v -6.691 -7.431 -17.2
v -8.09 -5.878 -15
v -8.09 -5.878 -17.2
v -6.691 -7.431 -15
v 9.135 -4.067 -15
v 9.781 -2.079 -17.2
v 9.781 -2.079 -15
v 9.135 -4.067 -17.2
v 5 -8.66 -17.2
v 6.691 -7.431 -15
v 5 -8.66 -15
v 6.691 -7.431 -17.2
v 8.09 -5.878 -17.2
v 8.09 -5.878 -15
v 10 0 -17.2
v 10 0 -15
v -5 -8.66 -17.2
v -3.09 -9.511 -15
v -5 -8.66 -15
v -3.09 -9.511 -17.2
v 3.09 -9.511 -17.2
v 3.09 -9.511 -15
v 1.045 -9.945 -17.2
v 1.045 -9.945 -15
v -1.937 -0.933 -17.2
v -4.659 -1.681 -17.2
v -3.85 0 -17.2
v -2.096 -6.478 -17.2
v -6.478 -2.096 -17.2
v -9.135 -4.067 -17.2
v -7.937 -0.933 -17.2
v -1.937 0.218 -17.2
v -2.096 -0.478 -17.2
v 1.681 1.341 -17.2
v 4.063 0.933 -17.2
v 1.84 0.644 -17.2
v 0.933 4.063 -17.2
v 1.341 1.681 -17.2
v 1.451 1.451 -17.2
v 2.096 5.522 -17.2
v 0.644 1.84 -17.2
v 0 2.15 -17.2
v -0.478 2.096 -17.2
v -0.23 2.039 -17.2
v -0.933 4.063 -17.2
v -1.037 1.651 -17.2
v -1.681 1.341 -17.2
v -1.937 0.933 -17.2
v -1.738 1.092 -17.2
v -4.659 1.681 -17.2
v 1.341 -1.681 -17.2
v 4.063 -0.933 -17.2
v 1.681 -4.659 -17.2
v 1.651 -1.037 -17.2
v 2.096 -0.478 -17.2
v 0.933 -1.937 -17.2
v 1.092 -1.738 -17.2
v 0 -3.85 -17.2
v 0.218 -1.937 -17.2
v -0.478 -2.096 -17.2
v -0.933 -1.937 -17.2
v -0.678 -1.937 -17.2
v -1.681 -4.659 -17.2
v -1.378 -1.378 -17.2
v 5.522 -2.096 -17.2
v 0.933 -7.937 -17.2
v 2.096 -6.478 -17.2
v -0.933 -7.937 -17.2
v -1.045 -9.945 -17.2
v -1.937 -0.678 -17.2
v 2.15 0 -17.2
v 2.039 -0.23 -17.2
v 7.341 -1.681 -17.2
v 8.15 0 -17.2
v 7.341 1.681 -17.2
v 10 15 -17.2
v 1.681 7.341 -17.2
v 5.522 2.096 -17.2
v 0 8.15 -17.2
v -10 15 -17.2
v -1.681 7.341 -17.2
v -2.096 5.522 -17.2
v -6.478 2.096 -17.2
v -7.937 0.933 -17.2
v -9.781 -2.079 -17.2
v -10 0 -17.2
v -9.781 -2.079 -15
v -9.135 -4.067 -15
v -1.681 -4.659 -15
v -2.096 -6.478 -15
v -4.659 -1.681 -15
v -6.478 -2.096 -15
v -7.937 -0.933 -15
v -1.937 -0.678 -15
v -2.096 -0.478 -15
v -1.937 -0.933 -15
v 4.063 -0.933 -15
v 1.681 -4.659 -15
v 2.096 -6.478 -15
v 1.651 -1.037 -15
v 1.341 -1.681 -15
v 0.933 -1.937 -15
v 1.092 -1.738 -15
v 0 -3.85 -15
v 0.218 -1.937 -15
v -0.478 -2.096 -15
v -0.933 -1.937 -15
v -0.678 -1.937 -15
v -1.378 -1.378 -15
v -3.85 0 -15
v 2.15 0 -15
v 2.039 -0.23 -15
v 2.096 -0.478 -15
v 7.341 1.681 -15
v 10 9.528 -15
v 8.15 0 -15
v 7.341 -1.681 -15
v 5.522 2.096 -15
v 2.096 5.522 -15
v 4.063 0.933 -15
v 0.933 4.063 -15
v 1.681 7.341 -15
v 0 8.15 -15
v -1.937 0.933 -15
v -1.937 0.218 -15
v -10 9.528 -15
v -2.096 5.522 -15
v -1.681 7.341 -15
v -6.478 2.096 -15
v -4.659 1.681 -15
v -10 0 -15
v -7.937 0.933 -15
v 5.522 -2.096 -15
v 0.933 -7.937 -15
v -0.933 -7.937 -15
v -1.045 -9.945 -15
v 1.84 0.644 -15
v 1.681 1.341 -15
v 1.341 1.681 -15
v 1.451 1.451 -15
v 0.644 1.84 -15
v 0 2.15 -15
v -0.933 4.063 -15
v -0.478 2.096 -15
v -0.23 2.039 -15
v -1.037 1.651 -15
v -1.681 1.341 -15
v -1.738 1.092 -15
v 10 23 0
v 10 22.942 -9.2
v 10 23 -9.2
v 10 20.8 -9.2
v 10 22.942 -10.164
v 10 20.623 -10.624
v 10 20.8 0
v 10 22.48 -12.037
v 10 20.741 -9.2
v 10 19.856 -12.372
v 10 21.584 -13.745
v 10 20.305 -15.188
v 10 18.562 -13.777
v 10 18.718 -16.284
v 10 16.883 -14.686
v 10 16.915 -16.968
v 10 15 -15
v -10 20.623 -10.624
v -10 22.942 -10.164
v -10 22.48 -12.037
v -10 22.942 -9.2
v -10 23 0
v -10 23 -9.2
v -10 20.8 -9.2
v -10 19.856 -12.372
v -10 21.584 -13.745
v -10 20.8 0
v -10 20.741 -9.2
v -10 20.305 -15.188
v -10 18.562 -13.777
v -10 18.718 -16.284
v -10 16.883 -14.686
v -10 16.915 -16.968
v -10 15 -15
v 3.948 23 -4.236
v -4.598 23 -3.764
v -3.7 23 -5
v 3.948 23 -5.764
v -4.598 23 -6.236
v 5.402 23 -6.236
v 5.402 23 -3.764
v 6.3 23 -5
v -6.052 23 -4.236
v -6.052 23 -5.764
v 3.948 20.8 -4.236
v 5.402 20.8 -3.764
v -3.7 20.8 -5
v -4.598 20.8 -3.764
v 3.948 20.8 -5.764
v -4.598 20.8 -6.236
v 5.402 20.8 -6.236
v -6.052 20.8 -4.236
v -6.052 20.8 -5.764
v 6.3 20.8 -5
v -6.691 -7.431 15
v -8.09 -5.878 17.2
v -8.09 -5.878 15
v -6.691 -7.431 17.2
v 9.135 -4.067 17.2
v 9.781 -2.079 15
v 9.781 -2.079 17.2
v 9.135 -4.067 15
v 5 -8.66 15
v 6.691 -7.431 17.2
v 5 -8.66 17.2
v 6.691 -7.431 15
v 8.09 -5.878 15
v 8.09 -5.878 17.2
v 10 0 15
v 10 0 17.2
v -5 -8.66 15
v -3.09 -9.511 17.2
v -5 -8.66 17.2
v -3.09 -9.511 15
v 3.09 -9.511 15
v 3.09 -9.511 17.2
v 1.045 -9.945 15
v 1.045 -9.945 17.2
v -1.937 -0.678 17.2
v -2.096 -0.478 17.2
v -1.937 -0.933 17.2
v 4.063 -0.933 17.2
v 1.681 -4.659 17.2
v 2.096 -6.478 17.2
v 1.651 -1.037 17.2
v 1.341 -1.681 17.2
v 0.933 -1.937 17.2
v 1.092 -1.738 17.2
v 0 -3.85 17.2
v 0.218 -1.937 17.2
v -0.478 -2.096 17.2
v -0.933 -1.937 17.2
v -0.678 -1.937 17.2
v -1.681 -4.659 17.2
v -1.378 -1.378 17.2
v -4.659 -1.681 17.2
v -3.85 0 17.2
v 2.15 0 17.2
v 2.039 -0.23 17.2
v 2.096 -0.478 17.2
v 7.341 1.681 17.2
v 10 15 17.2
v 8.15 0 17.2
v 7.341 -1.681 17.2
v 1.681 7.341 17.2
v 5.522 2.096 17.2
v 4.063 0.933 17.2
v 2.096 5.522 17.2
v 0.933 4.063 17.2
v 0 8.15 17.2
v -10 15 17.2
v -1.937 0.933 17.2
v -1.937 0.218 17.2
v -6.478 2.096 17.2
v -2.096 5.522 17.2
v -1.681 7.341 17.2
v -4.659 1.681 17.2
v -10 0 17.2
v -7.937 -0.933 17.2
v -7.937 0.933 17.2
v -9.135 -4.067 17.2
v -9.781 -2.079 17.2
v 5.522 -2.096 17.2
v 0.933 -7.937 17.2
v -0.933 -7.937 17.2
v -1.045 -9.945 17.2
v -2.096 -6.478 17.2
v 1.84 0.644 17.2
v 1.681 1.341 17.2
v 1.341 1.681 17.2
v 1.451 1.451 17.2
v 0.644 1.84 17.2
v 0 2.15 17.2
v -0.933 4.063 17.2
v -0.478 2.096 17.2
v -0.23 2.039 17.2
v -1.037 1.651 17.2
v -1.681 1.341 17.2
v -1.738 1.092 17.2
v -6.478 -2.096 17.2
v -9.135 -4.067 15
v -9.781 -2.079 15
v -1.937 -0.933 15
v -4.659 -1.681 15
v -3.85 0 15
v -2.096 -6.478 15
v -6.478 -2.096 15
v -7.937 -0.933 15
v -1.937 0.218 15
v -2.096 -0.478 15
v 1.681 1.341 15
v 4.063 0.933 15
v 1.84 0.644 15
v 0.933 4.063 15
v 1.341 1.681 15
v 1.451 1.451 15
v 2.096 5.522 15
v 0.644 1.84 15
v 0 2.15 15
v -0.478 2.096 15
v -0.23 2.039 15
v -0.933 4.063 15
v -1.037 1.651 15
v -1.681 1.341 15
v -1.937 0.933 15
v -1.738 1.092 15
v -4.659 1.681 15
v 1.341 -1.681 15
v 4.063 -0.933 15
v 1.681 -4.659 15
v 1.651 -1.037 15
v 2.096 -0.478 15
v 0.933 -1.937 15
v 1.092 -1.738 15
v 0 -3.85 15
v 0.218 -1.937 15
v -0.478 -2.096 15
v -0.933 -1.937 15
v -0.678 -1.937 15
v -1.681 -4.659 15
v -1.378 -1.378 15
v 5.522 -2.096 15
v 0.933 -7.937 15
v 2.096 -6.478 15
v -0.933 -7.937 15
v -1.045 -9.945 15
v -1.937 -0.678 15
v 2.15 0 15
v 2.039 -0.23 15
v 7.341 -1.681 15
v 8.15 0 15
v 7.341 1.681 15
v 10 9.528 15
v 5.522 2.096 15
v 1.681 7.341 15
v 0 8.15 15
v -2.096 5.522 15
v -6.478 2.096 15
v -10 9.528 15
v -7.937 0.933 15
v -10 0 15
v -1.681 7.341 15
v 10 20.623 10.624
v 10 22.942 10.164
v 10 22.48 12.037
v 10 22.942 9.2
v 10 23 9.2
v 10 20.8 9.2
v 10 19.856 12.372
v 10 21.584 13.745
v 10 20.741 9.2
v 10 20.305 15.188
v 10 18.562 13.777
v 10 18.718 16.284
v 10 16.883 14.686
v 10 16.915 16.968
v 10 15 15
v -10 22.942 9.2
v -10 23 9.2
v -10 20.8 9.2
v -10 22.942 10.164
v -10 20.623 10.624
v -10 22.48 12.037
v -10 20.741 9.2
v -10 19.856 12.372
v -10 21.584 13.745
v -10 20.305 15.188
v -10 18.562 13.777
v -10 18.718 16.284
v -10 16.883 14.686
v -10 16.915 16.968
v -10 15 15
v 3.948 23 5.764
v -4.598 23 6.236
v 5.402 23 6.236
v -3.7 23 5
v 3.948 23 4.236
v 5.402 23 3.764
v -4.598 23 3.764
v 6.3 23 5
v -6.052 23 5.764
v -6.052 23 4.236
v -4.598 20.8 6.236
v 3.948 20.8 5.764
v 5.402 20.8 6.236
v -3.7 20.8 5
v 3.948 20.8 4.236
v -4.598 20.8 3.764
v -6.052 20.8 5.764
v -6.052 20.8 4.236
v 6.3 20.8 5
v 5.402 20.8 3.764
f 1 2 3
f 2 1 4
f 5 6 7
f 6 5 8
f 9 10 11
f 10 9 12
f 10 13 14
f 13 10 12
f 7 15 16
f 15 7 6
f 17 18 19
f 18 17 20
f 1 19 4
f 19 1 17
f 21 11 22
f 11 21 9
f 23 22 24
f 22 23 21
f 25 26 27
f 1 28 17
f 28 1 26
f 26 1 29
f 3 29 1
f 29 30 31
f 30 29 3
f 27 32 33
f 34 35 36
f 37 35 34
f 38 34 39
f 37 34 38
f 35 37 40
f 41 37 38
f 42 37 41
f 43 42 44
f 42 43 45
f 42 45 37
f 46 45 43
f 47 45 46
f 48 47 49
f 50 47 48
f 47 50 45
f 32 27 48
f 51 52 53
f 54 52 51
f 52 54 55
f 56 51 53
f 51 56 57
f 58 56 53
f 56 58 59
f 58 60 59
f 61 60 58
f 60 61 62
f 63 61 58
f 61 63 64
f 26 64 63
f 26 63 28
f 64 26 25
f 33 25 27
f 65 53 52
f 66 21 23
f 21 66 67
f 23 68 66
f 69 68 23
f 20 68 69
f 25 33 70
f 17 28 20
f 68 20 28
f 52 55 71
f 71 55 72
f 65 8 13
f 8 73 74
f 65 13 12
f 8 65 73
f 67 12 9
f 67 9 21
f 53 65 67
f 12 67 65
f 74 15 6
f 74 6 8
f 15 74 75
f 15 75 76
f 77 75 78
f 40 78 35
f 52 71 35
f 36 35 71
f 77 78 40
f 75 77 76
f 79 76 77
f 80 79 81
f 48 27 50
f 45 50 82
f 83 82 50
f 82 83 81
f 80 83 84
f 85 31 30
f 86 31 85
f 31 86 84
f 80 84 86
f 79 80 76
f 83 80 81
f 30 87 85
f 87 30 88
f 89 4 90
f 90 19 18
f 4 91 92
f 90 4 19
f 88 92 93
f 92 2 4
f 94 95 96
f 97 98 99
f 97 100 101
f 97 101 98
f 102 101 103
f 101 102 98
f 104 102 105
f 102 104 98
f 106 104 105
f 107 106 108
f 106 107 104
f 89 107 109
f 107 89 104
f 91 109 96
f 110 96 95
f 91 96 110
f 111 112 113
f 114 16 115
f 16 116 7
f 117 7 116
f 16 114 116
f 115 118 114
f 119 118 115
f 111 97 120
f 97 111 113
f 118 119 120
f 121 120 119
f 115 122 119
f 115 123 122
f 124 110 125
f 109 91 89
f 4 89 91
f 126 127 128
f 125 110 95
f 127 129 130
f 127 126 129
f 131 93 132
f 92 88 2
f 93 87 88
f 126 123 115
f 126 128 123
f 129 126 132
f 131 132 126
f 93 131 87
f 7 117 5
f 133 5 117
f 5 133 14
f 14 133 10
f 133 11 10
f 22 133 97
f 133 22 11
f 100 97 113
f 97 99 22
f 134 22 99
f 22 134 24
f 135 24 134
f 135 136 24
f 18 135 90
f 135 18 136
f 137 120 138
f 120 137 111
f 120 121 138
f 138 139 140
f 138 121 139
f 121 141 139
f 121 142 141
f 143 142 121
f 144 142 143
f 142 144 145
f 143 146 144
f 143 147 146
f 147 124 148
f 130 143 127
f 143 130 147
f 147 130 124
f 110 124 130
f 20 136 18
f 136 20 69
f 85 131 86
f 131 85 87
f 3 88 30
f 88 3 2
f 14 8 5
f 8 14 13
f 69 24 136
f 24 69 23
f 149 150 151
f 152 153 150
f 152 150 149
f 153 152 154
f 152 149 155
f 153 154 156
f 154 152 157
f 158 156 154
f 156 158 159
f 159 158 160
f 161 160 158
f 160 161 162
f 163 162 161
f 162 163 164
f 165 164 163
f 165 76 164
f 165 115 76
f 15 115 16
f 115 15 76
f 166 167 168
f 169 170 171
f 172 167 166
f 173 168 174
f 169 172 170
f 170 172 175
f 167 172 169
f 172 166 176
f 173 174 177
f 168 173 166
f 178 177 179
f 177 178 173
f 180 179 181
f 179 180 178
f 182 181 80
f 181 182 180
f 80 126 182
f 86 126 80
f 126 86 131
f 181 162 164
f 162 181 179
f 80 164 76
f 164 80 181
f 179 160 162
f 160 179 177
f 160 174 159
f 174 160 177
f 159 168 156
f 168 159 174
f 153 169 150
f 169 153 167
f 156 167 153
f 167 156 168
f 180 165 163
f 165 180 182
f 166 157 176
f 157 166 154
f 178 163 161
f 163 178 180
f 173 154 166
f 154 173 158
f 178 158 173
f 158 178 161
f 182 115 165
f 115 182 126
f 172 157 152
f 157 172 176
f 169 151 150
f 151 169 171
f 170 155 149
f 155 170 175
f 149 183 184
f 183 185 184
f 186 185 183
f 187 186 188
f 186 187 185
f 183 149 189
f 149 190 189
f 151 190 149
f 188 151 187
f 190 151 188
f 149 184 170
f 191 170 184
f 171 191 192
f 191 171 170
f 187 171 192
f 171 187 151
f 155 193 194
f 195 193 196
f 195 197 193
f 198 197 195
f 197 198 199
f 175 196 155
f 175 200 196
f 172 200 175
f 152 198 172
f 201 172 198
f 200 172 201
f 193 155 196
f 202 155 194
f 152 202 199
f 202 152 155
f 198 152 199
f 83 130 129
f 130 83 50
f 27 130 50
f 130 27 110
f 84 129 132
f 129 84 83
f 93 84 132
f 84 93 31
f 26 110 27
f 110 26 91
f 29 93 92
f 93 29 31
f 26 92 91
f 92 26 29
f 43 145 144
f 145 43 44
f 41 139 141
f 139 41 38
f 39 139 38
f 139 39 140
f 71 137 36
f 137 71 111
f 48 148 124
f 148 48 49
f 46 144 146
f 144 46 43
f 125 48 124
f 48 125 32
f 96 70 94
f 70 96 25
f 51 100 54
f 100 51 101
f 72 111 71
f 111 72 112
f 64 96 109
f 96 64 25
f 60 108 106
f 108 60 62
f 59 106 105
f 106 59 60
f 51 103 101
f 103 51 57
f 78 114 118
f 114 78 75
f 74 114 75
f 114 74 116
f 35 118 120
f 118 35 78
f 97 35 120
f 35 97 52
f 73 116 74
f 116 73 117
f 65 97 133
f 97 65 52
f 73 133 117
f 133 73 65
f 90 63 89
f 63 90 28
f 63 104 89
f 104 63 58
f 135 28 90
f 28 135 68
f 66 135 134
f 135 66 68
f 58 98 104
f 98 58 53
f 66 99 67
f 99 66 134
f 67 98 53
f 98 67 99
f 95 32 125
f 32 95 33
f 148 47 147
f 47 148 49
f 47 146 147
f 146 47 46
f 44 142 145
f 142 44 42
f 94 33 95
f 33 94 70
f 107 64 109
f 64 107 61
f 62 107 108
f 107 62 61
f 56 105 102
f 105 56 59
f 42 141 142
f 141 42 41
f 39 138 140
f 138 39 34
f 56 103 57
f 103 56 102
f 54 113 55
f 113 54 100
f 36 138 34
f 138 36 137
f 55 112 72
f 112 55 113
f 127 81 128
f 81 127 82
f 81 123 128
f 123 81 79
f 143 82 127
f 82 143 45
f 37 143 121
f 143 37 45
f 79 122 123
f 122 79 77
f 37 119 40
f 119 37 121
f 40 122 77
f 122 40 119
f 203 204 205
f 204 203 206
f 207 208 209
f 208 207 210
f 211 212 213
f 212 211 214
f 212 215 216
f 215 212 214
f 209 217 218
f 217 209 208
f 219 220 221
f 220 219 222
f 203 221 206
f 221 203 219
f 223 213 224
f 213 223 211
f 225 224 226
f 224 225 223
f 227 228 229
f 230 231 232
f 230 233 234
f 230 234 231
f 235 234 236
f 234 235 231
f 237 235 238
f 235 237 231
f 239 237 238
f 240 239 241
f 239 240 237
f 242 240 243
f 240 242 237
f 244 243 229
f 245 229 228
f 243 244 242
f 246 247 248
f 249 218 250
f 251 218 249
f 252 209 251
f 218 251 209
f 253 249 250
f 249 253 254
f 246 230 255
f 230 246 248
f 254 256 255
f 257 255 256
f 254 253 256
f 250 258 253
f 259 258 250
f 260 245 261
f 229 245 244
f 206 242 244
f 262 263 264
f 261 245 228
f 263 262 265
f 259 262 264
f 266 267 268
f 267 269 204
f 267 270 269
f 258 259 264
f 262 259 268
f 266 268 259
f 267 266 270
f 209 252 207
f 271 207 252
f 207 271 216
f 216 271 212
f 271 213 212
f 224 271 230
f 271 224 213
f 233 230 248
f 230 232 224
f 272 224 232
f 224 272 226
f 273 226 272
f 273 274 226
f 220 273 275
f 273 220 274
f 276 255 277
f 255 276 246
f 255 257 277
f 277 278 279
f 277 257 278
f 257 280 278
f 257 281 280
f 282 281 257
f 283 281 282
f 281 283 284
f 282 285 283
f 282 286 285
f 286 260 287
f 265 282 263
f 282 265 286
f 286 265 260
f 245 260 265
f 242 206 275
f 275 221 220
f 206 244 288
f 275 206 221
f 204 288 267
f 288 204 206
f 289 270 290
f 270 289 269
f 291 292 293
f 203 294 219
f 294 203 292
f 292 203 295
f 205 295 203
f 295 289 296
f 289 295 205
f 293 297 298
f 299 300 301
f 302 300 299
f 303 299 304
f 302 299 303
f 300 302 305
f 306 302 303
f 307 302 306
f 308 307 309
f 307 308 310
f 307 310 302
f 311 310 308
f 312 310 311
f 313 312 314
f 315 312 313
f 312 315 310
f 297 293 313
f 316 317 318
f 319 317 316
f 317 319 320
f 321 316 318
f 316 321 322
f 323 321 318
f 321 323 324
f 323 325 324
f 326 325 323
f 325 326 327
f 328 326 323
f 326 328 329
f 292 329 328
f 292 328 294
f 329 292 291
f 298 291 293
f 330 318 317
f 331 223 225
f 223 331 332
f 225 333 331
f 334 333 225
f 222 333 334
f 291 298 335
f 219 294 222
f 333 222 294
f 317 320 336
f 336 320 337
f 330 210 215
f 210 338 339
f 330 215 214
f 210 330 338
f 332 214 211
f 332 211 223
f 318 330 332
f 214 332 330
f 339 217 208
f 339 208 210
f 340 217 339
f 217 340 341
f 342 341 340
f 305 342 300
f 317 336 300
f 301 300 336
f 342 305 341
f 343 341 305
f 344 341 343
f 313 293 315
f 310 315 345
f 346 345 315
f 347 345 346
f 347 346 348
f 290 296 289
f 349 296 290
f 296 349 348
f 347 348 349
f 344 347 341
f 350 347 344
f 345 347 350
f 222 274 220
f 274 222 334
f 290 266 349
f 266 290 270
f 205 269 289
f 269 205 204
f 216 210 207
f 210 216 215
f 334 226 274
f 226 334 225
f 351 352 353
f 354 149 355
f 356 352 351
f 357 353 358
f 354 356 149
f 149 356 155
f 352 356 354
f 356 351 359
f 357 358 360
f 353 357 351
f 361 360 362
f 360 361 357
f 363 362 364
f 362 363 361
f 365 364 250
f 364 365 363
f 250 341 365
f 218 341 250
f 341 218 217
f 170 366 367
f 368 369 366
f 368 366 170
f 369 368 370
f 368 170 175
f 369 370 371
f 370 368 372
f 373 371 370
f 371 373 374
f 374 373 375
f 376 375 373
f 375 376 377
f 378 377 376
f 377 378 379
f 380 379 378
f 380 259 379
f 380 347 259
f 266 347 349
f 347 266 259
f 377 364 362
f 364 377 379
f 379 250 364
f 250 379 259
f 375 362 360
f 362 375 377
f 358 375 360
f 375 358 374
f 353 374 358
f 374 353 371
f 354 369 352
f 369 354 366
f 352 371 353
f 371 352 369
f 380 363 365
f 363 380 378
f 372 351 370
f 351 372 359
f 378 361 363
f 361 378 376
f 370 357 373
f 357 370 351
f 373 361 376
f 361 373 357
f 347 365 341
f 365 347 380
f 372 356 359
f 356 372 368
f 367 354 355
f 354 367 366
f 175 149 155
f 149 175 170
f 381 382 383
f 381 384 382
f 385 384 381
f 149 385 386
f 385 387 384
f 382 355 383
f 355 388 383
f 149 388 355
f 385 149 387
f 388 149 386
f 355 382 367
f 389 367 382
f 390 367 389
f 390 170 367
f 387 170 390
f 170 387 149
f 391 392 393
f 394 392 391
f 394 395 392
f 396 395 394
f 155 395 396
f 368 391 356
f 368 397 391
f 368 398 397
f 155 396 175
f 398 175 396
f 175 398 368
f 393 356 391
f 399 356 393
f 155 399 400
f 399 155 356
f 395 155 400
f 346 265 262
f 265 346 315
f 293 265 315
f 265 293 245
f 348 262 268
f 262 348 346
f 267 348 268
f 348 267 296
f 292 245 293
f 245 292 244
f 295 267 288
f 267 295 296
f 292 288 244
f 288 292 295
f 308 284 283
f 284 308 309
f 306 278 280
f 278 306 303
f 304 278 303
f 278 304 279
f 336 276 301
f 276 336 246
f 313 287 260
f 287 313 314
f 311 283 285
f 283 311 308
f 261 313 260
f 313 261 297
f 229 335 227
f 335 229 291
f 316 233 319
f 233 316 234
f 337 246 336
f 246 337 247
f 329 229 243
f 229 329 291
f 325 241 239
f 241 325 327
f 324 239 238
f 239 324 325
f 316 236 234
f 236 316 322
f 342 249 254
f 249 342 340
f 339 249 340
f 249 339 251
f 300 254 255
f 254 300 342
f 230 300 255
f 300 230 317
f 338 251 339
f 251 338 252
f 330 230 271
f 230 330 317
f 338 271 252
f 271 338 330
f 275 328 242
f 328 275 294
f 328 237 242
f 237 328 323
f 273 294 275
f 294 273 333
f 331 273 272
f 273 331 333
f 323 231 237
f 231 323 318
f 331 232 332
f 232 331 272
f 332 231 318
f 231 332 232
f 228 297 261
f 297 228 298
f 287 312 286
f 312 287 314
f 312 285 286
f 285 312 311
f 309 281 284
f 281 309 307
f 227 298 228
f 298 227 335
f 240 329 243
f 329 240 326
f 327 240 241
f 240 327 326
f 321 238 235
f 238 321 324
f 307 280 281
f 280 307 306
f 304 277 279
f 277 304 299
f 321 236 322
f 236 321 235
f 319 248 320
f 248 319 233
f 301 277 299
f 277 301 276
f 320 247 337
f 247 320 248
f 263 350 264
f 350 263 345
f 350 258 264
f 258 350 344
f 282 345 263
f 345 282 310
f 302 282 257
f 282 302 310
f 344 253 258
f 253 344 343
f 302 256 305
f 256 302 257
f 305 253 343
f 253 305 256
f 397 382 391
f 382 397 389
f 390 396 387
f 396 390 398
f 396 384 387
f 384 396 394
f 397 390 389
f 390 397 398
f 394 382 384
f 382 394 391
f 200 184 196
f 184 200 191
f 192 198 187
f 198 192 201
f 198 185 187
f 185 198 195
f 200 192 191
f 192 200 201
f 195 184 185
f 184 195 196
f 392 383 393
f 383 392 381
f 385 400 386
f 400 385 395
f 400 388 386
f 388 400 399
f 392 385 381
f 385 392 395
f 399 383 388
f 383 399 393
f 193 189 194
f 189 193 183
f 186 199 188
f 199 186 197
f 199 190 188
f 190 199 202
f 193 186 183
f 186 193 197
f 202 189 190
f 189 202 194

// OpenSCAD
// file: ../models/ollo.scad
// Diameter of plastic ollo holes
OlloHoles = 4.3;

// Width of Ollo "real" plastic
OlloWidth = 3;

// Distance between two ollo holes
OlloSpacing = 6;

// Do an Ollo hole on the part
module olloHole(depth=2.2)
{
    translate([0,0,-0.1])
      cylinder(depth+0.2, OlloHoles/2, OlloHoles/2);
}

// Do 3 ollo holes
module threeOllo(depth=2.2)
{
  for (xy=[[-OlloSpacing,0],[0,0],[OlloSpacing,0]]) {
    translate([xy[0], xy[1], 0])
    olloHole(depth);
  }
}

// Do a servo arm holes
module servoArm(depth=2.2)
{
    threeOllo(depth);
    rotate([0,0,90])
      threeOllo(depth);
}
// main file
use <../models/ollo.scad>;

module u(height=15, radius=8, width=2.2, screwsSpacing=10, screwsDiameter=2.6, screws=true, print=false) {
    echo("[PART] u");
    module Ubranch() {
        union() {  
            cylinder(width, 10, 10);
            translate([-10,0,0])
                cube([20, height, width]);
        }
    }

    module USide() {
        difference() {
            union() {
                Ubranch();
                translate([-10,height+radius-width,radius])
                    cube([20,width,15-(radius-width)]);
                translate([-10,height,radius]) {
                    rotate([0,90,0]) {
                        difference() {
                            cylinder(20,radius,radius);
                            translate([0,0,-1])
                                cylinder(22,radius-width,radius-width);
                            translate([-10+radius-width,-10,-1])
                                cube([10,10,22]);
                            translate([-10,-20+radius-width,-1])
                                cube([10,20.01,22]);
                        }
                    }
                }
            }
            servoArm(depth=6);
        }
    }

    module UScrews() {
        for (x=[-screwsSpacing/2,screwsSpacing/2]) {
            for (y=[-screwsSpacing/2,screwsSpacing/2]) {
                rotate([270,0,0])
                    translate([x,y,0])
                    cylinder(d=screwsDiameter, h=100);
            }
        }
    }

    if (print) {
        translate([0,0,10])
            rotate([0,90,0])
            u(height,radius,width,screwsSpacing,screwsDiameter,screws,false);
    } else {
        difference() {
            translate([0,0,-15-width]) {
                USide();
                mirror([0,0,1]) translate([0,0,-2*width-30])  
                    USide();
            }
            if (screws) {
                UScrews();
            }
        }
    }
}

u();
